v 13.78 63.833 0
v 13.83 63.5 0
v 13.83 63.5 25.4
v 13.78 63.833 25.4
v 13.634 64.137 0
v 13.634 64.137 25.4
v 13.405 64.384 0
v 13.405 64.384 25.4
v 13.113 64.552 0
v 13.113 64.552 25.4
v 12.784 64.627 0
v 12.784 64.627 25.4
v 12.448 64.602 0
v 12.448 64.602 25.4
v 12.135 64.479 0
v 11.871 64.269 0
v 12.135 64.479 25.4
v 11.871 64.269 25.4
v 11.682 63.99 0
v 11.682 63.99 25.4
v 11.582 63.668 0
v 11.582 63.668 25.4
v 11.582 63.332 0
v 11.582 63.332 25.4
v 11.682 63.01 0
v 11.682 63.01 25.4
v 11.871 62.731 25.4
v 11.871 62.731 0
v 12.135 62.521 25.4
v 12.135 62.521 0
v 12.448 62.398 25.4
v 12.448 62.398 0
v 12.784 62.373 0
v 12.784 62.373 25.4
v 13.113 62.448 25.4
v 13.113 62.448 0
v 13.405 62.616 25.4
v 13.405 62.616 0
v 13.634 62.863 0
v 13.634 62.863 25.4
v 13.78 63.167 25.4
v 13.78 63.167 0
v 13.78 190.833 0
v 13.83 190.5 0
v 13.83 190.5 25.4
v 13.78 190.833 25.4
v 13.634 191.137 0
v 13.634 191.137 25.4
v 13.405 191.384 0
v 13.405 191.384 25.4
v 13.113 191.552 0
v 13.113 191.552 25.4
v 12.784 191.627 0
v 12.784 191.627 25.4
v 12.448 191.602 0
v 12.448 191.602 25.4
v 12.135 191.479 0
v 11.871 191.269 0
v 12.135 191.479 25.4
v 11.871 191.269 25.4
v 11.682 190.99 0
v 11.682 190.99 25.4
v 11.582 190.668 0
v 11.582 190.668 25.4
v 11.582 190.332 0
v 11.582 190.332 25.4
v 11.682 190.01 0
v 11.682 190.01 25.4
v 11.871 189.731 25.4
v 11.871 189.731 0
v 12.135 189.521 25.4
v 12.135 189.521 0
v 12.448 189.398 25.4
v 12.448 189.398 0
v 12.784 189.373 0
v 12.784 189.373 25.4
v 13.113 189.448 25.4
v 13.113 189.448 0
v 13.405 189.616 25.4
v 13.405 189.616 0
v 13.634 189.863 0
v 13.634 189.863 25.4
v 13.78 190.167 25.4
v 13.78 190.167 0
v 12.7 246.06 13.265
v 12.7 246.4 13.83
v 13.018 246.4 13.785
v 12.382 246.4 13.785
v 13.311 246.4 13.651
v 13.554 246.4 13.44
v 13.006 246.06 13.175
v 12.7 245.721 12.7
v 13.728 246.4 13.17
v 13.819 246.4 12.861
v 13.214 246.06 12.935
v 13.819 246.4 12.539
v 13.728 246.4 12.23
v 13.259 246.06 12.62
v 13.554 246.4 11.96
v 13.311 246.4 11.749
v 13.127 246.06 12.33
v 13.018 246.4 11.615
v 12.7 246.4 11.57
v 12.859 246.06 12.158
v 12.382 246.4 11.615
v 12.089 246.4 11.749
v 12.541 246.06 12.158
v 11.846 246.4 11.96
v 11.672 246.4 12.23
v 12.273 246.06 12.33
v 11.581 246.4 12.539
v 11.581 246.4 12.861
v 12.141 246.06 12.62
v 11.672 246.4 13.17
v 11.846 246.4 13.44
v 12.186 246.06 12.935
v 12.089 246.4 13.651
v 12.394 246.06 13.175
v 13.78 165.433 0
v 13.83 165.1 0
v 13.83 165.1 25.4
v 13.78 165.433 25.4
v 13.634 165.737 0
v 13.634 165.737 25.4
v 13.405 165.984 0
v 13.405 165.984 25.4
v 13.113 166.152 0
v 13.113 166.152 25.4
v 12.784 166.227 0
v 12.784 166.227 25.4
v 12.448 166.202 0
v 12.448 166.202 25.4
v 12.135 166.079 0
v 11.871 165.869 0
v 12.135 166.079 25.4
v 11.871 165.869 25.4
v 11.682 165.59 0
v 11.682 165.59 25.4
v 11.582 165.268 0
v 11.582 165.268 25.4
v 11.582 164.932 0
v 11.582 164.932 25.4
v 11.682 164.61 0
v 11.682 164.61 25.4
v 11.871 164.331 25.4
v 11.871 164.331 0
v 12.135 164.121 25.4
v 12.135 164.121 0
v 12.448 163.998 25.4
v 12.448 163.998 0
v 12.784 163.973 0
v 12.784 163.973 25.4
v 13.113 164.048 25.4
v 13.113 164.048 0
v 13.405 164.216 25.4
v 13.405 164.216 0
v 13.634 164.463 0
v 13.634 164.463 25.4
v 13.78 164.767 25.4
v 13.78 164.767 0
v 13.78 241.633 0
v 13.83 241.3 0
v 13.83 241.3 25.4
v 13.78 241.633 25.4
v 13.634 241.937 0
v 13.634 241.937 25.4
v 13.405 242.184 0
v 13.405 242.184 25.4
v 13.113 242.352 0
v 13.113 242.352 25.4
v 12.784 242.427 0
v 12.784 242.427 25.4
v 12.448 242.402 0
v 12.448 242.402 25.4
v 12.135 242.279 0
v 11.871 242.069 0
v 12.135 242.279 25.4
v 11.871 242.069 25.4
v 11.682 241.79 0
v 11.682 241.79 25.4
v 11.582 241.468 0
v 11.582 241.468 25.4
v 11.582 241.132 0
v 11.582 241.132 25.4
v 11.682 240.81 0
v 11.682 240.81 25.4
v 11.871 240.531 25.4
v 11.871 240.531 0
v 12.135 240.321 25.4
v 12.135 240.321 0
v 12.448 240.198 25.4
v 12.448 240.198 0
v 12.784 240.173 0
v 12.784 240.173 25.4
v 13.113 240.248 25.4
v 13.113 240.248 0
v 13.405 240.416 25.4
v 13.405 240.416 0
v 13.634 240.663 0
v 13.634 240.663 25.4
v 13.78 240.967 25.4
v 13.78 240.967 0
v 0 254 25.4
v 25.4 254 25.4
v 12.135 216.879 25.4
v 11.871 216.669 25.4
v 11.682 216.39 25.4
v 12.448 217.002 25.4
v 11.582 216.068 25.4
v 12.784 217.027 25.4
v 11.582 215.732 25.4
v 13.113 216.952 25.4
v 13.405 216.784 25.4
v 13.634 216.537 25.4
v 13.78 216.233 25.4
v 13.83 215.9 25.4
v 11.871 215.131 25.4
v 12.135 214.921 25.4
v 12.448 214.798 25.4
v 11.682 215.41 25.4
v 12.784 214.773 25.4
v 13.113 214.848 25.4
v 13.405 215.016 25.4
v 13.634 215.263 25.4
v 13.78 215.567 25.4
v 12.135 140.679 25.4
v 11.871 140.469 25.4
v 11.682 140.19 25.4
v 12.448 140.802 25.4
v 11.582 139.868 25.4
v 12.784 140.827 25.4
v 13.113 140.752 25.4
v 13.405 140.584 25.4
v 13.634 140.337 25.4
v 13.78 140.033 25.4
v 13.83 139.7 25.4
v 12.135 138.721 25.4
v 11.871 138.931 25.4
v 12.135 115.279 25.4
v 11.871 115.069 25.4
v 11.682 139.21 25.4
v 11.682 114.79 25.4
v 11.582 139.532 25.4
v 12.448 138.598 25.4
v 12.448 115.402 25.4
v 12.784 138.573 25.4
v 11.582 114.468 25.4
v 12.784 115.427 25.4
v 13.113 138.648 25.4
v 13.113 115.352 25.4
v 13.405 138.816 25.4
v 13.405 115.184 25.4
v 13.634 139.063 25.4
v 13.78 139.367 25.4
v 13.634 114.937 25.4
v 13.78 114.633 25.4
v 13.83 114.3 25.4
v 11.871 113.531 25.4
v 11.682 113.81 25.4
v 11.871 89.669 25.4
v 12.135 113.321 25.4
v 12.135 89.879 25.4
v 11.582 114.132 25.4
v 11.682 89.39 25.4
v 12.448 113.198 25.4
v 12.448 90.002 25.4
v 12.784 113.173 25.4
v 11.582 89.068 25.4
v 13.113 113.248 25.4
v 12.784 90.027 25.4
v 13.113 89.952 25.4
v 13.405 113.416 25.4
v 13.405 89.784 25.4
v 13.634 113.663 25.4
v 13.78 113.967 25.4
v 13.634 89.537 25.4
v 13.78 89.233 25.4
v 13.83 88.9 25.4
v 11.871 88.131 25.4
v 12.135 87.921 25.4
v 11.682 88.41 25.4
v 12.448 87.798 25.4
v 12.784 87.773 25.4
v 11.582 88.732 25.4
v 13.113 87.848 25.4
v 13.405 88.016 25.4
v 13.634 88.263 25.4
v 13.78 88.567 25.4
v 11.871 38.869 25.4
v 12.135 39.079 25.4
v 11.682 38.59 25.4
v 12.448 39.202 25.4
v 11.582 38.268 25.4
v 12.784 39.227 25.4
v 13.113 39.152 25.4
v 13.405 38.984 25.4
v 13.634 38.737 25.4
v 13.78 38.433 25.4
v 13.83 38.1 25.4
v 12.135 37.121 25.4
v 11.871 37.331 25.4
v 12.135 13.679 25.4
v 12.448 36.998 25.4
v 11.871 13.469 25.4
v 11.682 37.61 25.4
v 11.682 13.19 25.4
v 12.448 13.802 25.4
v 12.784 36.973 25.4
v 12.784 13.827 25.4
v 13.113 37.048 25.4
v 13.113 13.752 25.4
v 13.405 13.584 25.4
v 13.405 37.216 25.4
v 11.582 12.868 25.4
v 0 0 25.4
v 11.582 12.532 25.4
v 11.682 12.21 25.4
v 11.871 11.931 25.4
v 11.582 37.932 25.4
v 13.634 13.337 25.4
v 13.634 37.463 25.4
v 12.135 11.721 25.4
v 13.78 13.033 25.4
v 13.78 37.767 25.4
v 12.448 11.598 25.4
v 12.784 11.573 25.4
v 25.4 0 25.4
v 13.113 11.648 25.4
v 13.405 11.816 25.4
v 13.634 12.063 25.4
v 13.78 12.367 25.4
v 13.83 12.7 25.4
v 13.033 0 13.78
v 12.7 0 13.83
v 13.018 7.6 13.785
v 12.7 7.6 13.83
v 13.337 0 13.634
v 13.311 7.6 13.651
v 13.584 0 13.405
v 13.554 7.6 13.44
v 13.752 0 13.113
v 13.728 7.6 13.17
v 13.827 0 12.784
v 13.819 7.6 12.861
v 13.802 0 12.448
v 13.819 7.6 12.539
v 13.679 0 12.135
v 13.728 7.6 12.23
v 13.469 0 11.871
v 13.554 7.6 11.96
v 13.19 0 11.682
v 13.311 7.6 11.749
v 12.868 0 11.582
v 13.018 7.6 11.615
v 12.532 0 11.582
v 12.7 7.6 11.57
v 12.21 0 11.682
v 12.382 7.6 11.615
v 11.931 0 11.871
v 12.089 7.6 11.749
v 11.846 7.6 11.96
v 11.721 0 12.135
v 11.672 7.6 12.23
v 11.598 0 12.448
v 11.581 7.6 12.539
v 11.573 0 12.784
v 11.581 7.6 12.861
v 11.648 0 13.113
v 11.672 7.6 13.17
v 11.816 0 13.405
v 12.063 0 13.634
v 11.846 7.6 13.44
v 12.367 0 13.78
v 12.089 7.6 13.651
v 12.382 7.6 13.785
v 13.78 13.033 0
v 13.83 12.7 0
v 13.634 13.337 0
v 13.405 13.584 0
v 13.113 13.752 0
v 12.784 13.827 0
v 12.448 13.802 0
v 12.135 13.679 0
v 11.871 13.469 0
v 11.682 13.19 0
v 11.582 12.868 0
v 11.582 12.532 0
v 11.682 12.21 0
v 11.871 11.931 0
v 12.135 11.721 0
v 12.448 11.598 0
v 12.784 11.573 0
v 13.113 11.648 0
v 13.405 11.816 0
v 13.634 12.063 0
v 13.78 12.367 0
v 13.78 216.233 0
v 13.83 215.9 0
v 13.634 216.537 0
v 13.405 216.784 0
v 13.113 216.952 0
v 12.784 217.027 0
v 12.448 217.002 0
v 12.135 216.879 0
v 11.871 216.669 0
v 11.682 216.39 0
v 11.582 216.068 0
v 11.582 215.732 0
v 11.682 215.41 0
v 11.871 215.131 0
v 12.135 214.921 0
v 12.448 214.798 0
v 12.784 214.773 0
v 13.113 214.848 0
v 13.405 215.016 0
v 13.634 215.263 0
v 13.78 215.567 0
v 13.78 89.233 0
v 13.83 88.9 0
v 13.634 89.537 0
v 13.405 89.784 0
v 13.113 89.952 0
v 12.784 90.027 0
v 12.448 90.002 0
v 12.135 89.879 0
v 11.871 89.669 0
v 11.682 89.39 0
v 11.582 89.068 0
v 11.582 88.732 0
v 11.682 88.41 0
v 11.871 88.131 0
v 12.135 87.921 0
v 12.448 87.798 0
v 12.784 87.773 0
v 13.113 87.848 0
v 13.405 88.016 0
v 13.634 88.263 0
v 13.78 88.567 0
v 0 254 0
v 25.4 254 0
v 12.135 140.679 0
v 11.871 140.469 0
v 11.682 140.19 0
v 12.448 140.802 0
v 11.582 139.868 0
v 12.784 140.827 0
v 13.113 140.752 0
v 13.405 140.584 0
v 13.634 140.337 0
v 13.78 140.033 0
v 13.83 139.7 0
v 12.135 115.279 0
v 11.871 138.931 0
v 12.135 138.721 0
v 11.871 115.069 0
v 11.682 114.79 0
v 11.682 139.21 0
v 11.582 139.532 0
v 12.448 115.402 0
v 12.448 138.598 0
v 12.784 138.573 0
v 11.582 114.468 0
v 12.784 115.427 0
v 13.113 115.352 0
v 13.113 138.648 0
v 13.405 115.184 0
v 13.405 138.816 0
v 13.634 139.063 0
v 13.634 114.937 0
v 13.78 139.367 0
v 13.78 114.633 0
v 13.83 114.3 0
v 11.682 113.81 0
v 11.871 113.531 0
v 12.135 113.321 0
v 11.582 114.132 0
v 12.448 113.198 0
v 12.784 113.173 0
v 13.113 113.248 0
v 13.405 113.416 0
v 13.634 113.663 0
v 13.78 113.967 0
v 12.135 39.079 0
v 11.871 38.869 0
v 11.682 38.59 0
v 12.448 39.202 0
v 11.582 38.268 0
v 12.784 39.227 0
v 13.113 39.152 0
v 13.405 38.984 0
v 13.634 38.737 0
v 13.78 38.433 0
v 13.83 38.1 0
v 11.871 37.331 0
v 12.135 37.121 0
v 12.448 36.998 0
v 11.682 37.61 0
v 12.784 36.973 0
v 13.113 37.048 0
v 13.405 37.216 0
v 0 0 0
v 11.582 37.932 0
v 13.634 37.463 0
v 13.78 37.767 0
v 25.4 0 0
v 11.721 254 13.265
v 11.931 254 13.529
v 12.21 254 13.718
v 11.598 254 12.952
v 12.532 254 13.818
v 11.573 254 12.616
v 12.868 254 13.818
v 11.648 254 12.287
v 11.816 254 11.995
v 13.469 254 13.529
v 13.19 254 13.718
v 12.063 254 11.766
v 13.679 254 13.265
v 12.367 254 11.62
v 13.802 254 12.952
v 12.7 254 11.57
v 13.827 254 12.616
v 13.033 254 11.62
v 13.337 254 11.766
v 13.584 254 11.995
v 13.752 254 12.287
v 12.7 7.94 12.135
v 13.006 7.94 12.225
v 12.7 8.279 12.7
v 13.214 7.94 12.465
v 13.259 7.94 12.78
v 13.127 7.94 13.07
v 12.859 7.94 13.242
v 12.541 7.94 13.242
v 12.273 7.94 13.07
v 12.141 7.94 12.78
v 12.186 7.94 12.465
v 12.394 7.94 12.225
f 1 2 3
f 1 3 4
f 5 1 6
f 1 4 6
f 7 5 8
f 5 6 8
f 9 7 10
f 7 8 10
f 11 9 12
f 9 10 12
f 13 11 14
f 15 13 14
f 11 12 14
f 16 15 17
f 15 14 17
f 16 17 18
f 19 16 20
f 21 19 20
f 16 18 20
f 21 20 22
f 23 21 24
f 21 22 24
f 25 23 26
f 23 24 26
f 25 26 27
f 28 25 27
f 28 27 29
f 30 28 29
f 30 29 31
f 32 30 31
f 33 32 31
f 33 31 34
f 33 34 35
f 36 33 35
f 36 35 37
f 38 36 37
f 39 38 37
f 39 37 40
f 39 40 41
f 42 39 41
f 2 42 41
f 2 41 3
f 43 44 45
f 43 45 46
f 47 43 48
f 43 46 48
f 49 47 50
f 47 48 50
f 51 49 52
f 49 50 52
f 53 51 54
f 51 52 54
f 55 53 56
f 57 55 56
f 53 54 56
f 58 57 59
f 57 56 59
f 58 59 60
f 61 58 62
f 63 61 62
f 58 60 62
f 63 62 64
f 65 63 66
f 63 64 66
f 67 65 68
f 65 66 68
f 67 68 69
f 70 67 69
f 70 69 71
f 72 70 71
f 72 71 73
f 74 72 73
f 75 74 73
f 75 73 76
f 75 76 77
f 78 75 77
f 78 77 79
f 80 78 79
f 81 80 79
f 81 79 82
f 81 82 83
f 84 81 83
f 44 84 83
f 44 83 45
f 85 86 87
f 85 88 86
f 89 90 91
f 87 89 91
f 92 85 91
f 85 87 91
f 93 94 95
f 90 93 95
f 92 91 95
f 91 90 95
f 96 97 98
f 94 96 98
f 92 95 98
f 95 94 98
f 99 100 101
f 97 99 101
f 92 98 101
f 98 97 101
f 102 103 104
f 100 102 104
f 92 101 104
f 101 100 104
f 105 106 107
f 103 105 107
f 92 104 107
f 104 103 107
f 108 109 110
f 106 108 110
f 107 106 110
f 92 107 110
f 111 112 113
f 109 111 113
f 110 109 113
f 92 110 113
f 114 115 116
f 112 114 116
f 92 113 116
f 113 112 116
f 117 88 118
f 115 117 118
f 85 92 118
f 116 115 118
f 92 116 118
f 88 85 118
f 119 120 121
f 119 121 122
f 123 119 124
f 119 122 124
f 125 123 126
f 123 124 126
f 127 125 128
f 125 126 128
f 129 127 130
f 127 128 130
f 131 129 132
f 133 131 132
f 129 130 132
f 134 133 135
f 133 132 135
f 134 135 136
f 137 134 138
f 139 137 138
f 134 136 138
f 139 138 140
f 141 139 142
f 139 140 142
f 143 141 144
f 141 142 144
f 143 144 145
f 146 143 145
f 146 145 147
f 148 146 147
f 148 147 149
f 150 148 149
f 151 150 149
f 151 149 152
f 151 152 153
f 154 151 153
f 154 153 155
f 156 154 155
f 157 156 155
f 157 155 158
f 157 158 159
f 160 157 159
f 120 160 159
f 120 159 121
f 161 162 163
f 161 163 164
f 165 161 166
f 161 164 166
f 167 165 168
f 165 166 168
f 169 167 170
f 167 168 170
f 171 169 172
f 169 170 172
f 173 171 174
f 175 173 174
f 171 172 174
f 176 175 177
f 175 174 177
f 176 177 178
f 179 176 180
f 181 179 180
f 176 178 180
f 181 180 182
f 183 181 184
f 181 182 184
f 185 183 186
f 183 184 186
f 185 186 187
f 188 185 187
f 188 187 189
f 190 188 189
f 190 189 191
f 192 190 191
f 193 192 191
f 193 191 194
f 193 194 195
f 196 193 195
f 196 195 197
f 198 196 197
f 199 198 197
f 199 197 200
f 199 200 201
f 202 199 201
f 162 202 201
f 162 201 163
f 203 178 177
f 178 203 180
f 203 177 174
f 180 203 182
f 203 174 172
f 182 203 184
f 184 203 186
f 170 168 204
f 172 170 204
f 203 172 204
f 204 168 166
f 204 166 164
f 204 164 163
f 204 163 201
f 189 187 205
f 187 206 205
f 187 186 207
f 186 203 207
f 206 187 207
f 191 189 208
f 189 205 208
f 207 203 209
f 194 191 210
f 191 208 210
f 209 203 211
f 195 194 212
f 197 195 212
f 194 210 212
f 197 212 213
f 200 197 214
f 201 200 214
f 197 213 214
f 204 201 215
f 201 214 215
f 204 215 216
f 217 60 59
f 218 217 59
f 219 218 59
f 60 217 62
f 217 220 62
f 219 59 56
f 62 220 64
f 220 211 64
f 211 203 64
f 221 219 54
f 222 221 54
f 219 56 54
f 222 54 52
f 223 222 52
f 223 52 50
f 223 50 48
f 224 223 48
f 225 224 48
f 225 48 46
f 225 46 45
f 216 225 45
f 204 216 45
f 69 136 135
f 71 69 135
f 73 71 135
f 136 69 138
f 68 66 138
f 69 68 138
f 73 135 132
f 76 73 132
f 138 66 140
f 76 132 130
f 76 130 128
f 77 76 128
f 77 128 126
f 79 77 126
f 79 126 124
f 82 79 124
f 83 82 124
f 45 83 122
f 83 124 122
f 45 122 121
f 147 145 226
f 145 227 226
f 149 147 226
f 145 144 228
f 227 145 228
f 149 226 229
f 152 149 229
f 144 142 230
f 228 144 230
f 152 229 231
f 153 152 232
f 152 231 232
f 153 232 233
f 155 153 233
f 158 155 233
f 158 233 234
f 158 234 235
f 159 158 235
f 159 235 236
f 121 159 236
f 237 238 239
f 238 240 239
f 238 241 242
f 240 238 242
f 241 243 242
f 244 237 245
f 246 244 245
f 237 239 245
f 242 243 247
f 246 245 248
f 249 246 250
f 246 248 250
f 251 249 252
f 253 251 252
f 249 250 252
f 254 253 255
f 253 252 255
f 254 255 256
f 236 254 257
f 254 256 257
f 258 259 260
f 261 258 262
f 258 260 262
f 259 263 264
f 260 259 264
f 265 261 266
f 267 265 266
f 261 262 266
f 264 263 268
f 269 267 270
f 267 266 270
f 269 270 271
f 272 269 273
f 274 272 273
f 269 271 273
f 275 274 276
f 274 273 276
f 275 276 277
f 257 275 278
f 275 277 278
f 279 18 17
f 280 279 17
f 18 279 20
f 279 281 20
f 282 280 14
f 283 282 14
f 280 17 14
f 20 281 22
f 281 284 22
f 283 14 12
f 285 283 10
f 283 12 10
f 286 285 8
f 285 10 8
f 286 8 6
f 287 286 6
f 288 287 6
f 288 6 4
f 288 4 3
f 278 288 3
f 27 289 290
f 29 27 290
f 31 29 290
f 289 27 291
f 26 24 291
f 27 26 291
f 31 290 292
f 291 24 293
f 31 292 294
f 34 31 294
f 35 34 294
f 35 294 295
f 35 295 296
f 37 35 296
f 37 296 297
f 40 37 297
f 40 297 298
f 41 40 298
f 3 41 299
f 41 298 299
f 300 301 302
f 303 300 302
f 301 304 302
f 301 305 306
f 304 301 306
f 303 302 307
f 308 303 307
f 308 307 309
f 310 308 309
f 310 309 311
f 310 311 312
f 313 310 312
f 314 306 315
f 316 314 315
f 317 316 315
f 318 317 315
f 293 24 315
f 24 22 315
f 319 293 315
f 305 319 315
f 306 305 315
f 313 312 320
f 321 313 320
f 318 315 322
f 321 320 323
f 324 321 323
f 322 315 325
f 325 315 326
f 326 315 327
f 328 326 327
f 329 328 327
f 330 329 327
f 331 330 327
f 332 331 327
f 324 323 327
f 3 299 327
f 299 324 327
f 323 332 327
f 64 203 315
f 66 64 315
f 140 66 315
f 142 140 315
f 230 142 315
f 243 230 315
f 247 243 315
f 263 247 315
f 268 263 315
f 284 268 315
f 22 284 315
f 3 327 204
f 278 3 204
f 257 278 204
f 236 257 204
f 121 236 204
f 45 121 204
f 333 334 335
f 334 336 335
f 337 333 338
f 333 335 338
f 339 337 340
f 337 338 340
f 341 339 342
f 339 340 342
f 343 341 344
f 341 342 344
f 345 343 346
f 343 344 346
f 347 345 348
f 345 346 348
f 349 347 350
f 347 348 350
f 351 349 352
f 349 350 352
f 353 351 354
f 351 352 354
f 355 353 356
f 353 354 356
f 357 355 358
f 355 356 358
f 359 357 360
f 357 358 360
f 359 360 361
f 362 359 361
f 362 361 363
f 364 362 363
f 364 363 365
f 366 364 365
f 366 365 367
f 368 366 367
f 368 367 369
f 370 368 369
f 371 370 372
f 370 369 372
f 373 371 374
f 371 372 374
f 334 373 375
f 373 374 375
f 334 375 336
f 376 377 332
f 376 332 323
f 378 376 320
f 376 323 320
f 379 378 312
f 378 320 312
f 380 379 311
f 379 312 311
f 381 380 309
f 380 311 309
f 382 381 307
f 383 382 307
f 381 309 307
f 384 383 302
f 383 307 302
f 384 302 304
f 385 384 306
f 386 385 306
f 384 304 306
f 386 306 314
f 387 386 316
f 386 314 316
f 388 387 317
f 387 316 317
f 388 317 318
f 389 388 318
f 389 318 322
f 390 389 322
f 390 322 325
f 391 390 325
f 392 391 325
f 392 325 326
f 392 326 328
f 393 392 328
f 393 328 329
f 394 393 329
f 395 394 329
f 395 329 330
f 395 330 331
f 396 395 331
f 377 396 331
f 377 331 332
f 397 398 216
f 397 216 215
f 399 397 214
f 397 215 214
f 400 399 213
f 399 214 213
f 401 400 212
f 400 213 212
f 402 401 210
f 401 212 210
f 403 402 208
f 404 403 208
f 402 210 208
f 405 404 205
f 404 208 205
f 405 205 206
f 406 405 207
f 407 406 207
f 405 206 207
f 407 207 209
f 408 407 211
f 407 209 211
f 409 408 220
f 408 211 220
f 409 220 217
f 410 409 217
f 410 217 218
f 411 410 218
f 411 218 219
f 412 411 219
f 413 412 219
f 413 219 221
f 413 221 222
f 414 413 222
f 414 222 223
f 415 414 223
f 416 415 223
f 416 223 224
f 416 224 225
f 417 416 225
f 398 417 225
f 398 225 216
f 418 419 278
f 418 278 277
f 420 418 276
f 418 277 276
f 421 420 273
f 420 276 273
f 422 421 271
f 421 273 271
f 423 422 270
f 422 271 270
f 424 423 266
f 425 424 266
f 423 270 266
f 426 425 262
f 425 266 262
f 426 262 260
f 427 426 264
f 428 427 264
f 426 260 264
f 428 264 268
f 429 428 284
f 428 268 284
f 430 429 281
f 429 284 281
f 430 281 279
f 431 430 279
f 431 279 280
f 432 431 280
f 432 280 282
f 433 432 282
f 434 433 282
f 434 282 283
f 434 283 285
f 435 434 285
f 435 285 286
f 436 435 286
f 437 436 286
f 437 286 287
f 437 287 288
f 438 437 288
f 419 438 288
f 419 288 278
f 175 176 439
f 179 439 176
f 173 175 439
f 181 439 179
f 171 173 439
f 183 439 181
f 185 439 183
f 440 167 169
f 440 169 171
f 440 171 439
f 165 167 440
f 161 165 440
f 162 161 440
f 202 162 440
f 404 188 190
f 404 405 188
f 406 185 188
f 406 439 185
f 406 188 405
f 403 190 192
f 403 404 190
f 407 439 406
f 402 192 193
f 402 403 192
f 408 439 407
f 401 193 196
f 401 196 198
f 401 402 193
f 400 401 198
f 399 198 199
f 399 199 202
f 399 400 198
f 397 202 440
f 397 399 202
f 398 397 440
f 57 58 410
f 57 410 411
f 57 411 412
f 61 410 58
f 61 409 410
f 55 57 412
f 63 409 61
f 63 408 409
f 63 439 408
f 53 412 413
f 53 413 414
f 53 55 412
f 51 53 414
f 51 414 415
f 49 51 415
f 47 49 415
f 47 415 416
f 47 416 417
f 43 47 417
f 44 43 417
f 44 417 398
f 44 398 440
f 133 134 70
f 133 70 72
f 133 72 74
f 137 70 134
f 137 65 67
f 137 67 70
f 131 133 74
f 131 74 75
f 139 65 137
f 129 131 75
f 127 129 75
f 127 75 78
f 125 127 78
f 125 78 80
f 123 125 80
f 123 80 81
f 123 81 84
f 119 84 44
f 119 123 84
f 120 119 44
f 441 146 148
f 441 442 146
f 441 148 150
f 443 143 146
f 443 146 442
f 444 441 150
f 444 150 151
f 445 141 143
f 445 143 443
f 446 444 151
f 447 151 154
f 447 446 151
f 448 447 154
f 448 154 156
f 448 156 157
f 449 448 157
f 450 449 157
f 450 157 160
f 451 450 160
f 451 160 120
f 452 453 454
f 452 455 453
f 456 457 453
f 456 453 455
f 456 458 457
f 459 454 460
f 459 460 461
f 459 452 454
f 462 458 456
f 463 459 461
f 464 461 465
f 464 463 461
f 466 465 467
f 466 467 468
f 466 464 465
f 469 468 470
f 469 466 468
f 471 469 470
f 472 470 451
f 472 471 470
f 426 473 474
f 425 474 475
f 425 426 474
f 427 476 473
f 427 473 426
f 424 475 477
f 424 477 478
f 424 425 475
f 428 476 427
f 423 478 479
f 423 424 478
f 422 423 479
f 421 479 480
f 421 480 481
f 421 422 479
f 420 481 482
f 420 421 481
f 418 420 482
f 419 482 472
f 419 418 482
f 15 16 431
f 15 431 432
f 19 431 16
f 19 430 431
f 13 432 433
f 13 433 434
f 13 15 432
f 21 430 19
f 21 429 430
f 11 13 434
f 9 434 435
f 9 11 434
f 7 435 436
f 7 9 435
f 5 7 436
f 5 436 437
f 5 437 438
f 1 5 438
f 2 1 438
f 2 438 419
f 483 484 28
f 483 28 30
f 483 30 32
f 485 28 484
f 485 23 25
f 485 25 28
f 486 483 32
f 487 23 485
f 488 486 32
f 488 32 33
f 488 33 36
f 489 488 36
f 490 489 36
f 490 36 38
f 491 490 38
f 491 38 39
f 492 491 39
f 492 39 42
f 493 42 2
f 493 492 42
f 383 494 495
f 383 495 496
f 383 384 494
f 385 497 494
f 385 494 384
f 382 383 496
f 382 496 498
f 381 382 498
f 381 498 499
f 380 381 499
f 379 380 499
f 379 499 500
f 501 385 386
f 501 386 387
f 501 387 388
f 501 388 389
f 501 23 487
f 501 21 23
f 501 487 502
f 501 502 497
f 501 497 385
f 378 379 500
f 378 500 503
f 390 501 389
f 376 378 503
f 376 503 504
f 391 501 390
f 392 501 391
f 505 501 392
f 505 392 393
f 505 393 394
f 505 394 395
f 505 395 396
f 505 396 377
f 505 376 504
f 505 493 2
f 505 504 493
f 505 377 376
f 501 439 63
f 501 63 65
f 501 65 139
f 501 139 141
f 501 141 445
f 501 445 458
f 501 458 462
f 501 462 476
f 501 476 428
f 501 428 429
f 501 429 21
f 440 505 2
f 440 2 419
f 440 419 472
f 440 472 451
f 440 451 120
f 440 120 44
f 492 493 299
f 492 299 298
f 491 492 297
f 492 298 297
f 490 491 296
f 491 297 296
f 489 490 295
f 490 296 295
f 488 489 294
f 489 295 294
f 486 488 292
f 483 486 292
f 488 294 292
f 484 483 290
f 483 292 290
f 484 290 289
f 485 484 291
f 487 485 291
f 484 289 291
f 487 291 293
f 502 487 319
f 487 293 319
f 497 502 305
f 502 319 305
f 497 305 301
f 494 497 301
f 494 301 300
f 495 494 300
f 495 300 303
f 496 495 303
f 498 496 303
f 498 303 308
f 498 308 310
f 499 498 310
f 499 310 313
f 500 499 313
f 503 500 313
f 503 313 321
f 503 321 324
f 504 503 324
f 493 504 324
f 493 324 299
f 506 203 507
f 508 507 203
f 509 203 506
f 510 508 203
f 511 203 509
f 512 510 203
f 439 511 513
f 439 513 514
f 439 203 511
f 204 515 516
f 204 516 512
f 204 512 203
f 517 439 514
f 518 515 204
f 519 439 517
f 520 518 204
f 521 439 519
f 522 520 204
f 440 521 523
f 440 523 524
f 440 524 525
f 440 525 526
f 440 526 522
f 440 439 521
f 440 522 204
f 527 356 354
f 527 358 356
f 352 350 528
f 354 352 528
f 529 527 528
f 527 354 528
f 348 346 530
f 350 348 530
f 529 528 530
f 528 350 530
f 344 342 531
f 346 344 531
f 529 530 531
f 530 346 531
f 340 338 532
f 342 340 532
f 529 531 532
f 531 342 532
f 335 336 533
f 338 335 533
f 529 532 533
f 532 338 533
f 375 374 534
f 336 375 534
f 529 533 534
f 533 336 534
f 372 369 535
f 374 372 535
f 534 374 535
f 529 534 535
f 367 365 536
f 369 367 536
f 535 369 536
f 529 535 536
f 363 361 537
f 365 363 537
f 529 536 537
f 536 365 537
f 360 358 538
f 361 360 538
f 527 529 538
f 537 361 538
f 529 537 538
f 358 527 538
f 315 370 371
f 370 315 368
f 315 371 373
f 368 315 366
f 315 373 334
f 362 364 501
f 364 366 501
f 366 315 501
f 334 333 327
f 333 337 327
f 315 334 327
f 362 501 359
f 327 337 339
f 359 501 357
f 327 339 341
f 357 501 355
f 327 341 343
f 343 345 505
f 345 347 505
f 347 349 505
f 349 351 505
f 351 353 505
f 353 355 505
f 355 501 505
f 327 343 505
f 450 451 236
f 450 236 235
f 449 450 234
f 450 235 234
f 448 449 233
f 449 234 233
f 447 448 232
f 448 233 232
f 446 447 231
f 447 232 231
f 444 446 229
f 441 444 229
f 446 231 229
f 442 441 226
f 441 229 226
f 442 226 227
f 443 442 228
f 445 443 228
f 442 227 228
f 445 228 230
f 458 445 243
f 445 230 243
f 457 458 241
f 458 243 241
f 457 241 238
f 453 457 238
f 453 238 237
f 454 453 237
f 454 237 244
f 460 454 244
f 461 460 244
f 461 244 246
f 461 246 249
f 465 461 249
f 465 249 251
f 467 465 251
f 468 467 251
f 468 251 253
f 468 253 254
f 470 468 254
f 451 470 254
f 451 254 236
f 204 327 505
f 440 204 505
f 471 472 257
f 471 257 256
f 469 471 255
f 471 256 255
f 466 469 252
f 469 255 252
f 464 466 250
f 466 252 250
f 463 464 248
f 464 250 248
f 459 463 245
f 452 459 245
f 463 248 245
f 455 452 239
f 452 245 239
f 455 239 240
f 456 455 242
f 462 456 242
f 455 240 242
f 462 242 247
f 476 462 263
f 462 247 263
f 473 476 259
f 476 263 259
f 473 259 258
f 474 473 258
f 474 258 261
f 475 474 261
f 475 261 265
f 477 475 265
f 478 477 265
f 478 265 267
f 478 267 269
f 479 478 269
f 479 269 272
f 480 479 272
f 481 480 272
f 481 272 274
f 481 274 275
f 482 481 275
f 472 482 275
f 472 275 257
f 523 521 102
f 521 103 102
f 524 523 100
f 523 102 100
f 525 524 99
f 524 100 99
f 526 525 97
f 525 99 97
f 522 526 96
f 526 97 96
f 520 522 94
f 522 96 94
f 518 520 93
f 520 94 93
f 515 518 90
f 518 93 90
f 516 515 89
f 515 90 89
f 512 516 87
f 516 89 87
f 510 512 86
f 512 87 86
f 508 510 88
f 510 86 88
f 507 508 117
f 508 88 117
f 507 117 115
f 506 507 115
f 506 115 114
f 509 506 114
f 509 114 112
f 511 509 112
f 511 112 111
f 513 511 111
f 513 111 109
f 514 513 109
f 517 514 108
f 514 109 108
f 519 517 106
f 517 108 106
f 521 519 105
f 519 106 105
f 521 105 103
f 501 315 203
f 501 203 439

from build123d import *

# Parameters (mm, degrees)
SKETCH1_W                           = 25.4
SKETCH1_H                           = 25.4
BOSS_EXTRUDE1_DEPTH                 = 254
F_4_40_TAPPED_HOLE1_D               = 2.2606
F_4_40_TAPPED_HOLE1_DEPTH           = 7.6
F_4_40_TAPPED_HOLE1_TIP             = 0.679152758
F_4_40_TAPPED_HOLE1_ON_FACE_2_D     = 2.2606
F_4_40_TAPPED_HOLE1_ON_FACE_2_DEPTH = 7.6
F_4_40_TAPPED_HOLE1_ON_FACE_2_TIP   = 0.679152758
F_4_40_TAPPED_HOLE2_D               = 2.2606
LPATTERN1_COUNT                     = 10
LPATTERN1_PITCH                     = 25.4


with BuildPart() as part:
    # Sketch1 → Boss-Extrude1 (new body)
    with BuildSketch(Plane(origin=(0, 0, 0), x_dir=(1, 0, 0), z_dir=(0, 1, 0))):
        with Locations((12.7, -12.7)):
            Rectangle(SKETCH1_W, SKETCH1_H)
    extrude(amount=BOSS_EXTRUDE1_DEPTH)

    # #4-40 Tapped Hole1
    with Locations(Plane(origin=(12.7, 254, 12.7), x_dir=(0, 0, 1), z_dir=(0, 1, 0))):
        with Locations((0, 0)):
            Hole(F_4_40_TAPPED_HOLE1_D / 2, depth=F_4_40_TAPPED_HOLE1_DEPTH)
            with Locations((0, 0, -(F_4_40_TAPPED_HOLE1_DEPTH + F_4_40_TAPPED_HOLE1_TIP / 2))):  # 118° drill point
                Cone(0, F_4_40_TAPPED_HOLE1_D / 2, F_4_40_TAPPED_HOLE1_TIP, mode=Mode.SUBTRACT)

    # #4-40 Tapped Hole1 on face 2
    with Locations(Plane(origin=(12.7, 0, 12.7), x_dir=(0, 0, -1), z_dir=(0, -1, 0))):
        with Locations((0, 0)):
            Hole(F_4_40_TAPPED_HOLE1_ON_FACE_2_D / 2, depth=F_4_40_TAPPED_HOLE1_ON_FACE_2_DEPTH)
            with Locations((0, 0, -(F_4_40_TAPPED_HOLE1_ON_FACE_2_DEPTH + F_4_40_TAPPED_HOLE1_ON_FACE_2_TIP / 2))):  # 118° drill point
                Cone(0, F_4_40_TAPPED_HOLE1_ON_FACE_2_D / 2, F_4_40_TAPPED_HOLE1_ON_FACE_2_TIP, mode=Mode.SUBTRACT)

    # #4-40 Tapped Hole2 (through all)
    with Locations(Plane(origin=(12.7, 241.3, 0), x_dir=(-1, 0, 0), z_dir=(0, 0, -1))):
        with Locations((0, 0)):
            f_4_40_tapped_hole2 = Hole(F_4_40_TAPPED_HOLE2_D / 2)

    # LPattern1: #4-40 Tapped Hole2 ×10
    with Locations(*[(0, -i * LPATTERN1_PITCH, 0) for i in range(1, LPATTERN1_COUNT)]):
        add(f_4_40_tapped_hole2, mode=Mode.SUBTRACT)


solid = part.part
